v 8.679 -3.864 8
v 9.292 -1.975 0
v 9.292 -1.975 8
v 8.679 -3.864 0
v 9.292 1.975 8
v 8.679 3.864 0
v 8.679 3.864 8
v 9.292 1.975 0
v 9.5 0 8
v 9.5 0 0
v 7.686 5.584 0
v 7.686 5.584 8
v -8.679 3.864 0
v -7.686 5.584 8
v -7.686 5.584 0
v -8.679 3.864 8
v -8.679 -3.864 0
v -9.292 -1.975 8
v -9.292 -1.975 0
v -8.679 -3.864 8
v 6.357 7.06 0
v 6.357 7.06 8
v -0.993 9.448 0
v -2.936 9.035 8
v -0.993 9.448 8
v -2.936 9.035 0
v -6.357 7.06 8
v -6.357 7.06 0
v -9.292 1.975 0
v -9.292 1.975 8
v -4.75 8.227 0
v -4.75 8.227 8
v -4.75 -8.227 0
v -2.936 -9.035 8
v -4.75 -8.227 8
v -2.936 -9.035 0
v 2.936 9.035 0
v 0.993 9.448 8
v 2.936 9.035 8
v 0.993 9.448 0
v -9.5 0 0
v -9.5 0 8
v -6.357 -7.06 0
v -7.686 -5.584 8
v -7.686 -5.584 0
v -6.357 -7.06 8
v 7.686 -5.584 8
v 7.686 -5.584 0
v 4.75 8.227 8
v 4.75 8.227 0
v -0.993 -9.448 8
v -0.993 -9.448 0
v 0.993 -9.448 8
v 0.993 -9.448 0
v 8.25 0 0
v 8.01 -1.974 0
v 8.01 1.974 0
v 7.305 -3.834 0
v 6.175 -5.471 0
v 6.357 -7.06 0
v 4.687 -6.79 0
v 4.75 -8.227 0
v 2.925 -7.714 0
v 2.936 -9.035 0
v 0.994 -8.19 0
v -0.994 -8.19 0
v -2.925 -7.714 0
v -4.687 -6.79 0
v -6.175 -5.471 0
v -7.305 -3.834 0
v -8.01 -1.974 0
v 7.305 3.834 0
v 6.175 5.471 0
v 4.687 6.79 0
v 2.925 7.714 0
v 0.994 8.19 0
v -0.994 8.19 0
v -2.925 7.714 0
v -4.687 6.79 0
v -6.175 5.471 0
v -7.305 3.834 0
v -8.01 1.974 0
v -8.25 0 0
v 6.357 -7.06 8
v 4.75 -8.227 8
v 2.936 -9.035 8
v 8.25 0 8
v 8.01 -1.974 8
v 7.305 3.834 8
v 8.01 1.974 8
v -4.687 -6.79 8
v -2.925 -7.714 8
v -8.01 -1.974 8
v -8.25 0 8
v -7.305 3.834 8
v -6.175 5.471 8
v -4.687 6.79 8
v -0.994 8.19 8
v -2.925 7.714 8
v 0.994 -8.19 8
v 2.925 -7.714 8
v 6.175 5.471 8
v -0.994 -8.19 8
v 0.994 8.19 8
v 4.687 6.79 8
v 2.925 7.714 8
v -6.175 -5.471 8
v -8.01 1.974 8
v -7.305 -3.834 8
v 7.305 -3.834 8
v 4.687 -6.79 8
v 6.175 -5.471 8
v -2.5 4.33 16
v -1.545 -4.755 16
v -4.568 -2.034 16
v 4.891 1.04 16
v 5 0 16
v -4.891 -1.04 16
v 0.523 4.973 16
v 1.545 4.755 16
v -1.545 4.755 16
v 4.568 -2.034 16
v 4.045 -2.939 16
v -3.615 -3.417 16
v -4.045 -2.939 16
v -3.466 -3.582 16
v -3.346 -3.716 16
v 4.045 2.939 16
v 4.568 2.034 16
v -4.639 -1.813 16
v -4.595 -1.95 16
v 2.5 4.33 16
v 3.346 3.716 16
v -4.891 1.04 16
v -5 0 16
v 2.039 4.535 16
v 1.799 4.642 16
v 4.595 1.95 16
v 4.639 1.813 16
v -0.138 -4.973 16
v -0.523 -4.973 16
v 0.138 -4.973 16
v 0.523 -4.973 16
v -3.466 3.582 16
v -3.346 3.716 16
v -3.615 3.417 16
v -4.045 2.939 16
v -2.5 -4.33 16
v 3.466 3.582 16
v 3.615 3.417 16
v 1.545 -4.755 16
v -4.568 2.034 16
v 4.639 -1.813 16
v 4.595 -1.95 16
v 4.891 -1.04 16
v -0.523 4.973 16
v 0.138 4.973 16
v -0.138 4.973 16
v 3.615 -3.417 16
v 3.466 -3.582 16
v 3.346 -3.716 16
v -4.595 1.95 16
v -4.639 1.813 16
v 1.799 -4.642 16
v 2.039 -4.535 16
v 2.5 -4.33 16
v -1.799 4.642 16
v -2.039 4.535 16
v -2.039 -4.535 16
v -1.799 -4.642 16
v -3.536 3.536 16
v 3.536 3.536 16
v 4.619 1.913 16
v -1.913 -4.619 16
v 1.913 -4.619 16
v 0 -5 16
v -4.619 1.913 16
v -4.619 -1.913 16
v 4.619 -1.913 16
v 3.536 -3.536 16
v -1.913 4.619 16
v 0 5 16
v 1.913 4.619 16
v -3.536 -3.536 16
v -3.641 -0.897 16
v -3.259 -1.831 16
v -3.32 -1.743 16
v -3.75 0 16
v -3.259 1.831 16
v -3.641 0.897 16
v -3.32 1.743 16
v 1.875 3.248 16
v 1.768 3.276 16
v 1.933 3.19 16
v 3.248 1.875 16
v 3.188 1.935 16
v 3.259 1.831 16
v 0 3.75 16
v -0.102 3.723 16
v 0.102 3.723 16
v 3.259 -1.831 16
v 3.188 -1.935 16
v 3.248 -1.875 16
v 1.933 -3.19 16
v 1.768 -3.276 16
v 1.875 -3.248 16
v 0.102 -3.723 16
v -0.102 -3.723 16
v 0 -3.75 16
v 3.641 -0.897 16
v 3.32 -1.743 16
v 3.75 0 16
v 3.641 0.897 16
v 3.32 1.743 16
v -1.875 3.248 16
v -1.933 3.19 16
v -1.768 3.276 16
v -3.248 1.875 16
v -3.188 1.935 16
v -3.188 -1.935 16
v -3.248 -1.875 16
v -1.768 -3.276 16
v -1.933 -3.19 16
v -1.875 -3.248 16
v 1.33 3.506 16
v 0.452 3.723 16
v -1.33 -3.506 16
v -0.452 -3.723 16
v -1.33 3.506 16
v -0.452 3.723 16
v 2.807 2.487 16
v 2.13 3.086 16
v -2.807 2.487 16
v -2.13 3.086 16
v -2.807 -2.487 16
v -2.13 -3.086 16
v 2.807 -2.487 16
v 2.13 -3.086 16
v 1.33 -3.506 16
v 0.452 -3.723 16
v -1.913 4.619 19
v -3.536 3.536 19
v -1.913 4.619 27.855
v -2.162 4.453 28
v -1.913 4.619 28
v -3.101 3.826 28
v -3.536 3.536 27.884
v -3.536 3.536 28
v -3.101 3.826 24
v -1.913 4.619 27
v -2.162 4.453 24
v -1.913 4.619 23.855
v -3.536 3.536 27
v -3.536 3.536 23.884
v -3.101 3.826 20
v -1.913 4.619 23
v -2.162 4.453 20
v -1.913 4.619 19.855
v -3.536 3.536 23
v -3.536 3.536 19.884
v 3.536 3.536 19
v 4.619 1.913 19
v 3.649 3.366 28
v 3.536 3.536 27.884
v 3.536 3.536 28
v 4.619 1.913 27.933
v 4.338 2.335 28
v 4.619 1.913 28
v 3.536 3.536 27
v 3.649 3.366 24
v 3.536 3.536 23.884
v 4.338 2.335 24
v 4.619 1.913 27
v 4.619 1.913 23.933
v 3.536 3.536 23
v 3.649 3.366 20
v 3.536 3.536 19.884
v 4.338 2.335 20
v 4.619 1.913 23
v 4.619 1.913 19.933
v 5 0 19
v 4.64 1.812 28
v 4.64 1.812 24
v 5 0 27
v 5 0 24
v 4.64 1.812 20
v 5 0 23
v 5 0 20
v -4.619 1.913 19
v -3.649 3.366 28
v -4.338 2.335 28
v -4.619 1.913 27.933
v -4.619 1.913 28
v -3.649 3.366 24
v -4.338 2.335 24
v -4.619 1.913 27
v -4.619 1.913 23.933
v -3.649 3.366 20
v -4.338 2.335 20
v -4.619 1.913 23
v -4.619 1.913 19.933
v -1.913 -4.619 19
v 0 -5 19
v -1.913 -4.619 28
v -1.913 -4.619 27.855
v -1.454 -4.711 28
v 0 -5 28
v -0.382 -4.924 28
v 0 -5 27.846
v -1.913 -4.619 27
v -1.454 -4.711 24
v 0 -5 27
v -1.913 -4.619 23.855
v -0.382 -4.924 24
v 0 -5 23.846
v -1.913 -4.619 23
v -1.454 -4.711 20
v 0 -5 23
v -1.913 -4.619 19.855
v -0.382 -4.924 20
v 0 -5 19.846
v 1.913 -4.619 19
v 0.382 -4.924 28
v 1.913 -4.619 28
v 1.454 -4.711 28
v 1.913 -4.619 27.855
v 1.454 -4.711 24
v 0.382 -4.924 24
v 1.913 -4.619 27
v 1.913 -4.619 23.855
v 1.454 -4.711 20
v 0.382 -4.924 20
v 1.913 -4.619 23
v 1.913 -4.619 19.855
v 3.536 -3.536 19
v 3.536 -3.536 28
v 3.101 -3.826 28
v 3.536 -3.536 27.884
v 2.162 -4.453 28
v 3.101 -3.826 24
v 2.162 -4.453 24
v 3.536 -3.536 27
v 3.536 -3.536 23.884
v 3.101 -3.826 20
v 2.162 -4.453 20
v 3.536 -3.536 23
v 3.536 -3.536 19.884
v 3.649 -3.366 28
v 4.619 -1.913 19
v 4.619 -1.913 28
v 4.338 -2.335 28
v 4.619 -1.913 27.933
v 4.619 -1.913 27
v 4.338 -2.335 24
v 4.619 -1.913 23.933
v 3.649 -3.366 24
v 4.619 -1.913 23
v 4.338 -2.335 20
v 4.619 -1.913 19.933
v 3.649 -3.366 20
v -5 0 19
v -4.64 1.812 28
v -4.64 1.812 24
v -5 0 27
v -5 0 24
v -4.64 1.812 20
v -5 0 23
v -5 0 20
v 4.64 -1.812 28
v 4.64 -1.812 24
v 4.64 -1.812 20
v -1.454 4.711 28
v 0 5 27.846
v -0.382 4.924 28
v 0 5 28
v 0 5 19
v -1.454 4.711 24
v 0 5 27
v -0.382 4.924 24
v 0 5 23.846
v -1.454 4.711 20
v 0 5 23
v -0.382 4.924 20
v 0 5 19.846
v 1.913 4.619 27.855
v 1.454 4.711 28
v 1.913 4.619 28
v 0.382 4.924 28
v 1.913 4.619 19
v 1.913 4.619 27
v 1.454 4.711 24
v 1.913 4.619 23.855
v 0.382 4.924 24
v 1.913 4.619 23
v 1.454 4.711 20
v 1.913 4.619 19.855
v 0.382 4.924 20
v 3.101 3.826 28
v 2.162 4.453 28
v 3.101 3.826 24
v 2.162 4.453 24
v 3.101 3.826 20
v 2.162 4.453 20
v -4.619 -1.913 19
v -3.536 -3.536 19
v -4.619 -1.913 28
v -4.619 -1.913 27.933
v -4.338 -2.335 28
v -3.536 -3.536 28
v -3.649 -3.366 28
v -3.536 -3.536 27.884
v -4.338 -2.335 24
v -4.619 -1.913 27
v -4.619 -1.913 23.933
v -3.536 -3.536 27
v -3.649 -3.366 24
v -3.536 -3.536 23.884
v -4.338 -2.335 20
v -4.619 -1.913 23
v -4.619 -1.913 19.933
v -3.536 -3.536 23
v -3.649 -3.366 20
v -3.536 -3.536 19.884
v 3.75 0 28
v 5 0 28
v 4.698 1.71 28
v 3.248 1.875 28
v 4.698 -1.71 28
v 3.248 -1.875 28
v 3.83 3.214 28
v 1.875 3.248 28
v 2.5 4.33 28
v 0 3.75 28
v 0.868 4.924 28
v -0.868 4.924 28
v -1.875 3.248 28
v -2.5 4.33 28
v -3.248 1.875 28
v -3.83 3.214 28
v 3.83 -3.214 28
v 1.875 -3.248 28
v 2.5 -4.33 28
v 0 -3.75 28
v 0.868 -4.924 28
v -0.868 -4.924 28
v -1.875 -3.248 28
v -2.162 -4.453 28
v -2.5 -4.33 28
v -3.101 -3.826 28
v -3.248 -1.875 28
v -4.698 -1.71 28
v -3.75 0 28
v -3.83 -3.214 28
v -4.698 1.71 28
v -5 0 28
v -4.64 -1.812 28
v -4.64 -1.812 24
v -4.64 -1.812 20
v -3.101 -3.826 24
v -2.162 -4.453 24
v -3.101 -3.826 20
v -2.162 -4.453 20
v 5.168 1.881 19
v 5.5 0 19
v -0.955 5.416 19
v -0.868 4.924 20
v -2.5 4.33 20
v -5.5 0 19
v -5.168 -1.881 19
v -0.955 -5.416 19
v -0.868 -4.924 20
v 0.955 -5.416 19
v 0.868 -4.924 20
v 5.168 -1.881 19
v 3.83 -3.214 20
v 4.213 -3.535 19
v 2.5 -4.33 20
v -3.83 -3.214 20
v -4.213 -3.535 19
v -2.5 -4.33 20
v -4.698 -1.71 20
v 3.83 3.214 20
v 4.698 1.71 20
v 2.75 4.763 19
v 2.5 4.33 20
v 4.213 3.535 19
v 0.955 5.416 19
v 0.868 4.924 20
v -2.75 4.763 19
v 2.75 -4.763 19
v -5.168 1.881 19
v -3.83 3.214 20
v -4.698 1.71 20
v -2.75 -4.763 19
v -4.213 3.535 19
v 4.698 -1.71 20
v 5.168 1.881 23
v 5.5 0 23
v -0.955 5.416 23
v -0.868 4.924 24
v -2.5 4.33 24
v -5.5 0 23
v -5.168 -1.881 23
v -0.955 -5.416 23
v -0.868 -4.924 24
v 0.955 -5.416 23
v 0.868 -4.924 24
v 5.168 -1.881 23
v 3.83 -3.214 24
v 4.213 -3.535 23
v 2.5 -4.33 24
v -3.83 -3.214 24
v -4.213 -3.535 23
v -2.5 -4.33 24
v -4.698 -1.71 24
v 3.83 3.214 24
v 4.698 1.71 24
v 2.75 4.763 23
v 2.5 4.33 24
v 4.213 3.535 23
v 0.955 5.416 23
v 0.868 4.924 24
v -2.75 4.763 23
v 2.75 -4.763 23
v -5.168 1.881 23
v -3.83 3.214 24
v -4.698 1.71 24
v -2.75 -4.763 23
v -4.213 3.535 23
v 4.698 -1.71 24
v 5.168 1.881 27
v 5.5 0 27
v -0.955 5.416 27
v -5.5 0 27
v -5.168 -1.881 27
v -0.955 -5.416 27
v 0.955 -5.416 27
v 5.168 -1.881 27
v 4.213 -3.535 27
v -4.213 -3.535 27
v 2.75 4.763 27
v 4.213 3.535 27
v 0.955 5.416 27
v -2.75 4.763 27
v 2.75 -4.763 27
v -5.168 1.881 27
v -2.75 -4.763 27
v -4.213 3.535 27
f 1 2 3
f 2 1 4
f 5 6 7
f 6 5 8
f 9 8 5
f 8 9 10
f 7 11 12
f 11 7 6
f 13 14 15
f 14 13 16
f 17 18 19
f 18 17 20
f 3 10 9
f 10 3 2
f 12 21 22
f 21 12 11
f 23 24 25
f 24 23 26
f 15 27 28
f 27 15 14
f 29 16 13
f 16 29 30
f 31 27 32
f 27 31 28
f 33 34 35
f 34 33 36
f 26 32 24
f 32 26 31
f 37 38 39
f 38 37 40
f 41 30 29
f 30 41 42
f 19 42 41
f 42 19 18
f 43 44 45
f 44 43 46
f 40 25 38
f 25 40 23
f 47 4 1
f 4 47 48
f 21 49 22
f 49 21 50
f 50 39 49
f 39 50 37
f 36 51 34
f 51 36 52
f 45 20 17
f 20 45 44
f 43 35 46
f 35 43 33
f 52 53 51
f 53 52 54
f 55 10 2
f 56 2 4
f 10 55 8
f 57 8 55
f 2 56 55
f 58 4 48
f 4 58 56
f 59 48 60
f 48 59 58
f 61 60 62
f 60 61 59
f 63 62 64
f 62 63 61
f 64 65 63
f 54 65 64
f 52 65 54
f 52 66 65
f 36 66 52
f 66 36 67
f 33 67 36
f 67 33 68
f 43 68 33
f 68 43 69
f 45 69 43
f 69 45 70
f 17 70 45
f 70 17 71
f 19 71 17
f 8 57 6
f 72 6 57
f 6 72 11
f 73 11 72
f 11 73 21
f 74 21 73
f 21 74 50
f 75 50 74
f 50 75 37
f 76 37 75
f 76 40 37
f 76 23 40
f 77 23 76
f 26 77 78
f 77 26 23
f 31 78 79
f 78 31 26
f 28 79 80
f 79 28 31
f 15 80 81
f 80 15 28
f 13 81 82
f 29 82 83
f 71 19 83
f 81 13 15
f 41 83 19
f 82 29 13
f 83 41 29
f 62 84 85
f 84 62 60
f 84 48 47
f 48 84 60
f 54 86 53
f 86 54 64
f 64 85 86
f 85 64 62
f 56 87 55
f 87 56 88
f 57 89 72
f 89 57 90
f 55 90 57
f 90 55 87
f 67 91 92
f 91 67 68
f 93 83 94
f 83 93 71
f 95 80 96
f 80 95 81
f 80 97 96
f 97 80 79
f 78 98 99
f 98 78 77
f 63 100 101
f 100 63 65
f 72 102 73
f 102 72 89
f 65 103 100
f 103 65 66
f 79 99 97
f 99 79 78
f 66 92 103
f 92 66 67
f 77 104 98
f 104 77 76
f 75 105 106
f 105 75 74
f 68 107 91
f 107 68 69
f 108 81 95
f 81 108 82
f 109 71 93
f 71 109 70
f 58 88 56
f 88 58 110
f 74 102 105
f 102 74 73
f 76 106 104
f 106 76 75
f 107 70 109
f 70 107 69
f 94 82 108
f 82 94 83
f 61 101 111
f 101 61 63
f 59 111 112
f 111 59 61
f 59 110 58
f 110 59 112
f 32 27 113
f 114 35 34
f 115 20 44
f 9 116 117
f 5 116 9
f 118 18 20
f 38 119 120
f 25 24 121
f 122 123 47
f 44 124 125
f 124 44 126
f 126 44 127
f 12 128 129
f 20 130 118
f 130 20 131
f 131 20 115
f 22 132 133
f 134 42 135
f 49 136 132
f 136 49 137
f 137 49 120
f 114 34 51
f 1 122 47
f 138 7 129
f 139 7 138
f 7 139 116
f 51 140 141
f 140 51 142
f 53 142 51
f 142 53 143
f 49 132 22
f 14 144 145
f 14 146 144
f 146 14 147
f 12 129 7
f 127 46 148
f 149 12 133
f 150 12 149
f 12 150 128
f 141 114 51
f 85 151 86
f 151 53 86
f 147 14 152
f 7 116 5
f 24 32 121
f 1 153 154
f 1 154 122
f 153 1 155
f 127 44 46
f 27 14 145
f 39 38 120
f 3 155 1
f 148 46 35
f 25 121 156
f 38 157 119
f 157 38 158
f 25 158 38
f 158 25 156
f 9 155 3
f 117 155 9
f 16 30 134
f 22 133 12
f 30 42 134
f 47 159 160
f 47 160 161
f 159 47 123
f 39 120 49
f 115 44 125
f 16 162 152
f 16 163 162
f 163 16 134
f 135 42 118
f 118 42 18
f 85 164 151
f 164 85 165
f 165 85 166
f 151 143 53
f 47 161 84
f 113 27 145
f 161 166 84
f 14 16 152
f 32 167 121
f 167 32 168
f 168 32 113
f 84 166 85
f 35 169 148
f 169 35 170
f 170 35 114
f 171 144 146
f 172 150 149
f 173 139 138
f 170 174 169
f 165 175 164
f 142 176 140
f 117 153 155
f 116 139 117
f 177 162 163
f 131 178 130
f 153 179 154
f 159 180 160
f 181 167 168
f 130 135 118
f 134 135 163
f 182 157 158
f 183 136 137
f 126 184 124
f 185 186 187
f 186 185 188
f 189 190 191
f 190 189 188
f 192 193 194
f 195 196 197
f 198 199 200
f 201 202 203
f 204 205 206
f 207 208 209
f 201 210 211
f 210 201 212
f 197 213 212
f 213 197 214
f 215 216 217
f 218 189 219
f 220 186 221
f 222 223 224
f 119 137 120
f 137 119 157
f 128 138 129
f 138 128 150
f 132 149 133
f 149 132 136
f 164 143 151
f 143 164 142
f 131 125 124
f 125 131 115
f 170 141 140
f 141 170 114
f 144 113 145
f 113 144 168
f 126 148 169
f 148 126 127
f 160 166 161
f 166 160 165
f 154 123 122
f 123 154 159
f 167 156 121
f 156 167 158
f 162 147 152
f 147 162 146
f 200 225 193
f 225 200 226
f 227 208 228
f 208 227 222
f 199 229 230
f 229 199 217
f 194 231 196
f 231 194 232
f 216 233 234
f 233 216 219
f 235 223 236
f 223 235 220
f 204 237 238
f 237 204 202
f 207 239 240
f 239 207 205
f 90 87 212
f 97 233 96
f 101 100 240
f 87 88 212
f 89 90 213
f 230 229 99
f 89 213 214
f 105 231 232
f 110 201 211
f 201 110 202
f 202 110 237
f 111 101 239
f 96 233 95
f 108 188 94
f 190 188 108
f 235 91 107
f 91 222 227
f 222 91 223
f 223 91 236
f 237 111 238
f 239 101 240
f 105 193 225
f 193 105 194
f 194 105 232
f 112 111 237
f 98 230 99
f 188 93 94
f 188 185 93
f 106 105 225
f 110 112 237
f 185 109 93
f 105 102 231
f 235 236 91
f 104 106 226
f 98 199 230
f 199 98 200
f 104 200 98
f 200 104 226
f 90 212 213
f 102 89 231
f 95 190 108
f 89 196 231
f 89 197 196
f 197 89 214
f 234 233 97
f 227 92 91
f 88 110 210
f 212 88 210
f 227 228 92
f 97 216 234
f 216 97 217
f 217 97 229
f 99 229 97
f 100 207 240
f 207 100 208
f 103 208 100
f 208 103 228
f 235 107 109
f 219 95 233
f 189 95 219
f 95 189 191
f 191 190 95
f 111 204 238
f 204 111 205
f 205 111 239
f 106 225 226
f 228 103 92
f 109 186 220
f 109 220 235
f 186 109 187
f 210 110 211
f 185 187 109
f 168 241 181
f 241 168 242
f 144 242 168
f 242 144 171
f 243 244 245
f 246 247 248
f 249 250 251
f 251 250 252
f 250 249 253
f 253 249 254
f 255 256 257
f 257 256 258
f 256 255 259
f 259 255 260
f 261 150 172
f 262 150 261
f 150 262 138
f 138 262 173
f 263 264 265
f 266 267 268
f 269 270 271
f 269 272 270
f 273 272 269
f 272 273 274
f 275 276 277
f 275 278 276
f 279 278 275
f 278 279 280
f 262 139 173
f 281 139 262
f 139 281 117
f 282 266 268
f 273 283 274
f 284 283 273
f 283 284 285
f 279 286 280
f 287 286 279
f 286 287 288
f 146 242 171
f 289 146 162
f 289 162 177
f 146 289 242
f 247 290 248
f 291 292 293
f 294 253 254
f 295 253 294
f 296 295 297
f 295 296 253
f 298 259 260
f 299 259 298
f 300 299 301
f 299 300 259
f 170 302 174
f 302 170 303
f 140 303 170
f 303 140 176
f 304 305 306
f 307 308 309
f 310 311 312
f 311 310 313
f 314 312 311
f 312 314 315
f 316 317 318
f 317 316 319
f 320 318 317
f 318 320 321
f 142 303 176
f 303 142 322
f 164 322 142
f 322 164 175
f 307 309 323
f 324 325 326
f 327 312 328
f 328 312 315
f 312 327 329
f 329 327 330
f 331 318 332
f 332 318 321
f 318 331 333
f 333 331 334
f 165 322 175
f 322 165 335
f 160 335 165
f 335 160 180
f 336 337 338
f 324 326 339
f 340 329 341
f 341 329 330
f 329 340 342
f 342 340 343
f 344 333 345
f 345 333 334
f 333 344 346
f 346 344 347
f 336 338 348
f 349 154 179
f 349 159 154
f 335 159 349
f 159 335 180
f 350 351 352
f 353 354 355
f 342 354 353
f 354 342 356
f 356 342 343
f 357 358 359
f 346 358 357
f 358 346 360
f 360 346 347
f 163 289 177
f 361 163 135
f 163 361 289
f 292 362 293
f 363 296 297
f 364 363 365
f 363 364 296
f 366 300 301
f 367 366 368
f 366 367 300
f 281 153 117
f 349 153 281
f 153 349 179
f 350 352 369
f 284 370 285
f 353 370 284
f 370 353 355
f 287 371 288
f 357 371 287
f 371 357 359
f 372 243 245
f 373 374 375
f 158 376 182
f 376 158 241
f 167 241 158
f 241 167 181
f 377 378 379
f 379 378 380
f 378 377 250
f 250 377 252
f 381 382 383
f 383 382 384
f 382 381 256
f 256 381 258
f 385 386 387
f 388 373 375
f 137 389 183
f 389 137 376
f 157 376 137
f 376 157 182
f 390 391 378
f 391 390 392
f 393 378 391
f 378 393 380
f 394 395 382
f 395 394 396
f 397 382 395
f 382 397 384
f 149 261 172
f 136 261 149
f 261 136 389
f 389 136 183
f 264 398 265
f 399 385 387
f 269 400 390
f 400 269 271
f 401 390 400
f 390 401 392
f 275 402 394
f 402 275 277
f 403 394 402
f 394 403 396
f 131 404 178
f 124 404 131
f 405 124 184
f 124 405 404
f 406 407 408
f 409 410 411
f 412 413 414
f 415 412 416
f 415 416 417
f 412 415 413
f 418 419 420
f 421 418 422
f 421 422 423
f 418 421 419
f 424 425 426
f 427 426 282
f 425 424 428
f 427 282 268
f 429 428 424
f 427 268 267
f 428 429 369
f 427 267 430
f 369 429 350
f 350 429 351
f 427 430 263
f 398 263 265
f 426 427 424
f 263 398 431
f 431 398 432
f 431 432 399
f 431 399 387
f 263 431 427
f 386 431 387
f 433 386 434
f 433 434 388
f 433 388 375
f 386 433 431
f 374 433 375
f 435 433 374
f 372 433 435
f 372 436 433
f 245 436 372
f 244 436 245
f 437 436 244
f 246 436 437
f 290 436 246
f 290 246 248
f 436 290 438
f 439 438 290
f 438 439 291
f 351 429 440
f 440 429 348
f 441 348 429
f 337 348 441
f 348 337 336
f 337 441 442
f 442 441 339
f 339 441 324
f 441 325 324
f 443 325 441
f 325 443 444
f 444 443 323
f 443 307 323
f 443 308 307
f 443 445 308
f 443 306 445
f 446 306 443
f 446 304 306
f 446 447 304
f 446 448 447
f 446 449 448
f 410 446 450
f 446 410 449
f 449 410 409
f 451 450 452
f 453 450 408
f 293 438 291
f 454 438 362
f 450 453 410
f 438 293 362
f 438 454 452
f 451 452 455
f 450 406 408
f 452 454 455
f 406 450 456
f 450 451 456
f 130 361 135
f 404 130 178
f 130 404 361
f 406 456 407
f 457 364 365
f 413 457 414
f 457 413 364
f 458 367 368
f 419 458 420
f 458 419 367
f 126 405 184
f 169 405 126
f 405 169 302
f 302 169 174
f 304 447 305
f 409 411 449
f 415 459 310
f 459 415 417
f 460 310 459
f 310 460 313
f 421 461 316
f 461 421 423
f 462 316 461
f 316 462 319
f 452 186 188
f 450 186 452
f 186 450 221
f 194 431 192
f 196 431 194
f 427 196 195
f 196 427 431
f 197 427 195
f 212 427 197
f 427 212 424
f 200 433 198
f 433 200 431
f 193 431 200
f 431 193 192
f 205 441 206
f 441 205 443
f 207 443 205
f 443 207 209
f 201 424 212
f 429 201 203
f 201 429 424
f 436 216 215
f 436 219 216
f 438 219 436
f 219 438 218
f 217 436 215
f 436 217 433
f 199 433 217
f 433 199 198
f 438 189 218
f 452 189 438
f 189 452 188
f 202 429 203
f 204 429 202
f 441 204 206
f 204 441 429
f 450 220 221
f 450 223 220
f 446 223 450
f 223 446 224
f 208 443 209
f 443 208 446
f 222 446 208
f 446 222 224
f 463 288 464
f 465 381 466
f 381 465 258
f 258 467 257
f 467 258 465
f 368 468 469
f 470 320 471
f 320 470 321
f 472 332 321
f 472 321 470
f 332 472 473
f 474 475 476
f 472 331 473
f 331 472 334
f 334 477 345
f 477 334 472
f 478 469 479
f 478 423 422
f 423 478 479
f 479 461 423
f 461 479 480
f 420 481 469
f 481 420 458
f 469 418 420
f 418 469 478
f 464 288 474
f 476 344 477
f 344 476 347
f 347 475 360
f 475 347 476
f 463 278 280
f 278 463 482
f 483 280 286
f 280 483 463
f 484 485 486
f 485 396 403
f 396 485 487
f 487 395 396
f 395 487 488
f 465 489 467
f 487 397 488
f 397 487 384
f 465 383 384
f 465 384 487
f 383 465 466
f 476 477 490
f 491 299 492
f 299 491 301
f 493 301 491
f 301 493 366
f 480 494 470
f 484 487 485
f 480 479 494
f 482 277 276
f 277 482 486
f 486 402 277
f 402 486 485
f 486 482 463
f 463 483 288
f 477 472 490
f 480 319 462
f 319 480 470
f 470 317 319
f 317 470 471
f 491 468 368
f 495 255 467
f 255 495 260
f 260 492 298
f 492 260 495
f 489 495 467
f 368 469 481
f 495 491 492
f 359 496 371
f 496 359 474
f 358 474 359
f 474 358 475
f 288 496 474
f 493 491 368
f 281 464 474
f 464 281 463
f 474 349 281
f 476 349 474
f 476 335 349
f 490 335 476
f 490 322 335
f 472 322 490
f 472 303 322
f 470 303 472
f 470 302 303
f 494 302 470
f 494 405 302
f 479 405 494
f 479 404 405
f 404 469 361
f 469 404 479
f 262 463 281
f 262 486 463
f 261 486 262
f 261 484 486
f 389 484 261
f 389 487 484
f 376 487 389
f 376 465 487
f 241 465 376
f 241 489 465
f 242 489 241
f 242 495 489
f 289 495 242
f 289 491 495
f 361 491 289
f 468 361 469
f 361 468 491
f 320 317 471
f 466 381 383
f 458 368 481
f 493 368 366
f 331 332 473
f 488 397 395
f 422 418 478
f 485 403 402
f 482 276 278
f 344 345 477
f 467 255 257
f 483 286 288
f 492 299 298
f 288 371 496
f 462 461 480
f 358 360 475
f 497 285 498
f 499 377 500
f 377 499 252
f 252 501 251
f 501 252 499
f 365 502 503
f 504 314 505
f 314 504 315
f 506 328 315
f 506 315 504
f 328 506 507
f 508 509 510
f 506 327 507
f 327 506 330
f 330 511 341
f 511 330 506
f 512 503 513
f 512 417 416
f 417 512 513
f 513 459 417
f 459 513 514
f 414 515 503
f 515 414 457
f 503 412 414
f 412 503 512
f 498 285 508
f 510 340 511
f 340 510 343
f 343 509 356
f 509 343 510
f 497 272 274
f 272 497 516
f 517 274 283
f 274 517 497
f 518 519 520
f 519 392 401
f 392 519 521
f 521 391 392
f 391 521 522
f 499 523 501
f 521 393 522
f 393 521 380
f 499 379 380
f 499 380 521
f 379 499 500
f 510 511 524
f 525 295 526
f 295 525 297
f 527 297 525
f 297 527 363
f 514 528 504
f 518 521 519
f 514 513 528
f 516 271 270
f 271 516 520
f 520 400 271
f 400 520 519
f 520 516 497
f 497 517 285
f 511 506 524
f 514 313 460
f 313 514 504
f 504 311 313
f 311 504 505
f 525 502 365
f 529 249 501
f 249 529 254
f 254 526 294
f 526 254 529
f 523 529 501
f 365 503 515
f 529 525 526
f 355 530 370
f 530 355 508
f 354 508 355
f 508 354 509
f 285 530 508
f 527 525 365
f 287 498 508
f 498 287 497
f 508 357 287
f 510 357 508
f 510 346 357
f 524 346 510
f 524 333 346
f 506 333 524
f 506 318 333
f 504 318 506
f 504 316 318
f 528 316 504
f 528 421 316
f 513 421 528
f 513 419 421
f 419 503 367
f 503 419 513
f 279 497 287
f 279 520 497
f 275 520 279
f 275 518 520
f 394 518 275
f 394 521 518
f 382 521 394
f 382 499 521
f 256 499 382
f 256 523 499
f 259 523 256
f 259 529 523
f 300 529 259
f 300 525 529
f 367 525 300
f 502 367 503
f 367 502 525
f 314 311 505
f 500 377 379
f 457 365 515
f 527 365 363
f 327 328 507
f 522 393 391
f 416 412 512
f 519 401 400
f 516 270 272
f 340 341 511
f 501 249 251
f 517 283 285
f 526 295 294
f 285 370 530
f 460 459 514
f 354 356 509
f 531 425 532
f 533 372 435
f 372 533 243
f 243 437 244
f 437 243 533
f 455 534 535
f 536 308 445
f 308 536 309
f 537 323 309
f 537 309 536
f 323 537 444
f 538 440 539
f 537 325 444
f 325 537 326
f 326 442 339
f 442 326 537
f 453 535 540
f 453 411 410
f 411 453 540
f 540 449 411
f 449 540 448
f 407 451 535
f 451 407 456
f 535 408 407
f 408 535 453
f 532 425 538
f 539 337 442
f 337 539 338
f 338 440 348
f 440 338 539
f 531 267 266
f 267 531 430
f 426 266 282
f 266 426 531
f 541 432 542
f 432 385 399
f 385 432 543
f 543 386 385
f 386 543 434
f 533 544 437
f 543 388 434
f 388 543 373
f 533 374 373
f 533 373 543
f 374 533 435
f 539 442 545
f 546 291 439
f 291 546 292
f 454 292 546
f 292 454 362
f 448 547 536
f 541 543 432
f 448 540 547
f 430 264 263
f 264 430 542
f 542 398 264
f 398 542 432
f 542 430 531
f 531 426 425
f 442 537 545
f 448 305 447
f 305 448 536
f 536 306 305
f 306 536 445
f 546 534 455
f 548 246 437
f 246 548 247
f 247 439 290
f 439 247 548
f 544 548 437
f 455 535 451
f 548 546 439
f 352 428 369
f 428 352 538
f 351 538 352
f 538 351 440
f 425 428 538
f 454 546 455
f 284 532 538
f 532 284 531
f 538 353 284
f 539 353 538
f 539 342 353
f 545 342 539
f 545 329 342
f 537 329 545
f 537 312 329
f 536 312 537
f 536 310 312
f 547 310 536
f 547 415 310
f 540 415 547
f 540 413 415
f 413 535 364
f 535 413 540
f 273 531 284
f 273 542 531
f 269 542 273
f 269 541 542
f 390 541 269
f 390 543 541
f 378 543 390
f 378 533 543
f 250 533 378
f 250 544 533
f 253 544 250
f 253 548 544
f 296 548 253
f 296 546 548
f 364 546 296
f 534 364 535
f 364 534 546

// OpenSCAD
difference(){
cylinder(h = 8, r1 = 9.5, r2 = 9.5);
    cylinder(h=8,r1 =8.25,r2=8.25);
}
translate([0, 0, 8])
difference(){
cylinder(h = 8, r1 = 9.5, r2 = 5);
    cylinder(h=8,r1 =8.25,r2=3.75);
}
translate([0, 0, 16])
difference(){
cylinder(h = 12, r1 = 5, r2 = 5);
    cylinder(h=12,r1 =3.75,r2=3.75);
}
translate([0, 0, 19])
difference(){
cylinder(h = 1, r1 = 5.5, r2 = 5);
    cylinder(h=1,r1 =3.75,r2=3.75);
}
translate([0, 0, 23])
difference(){
cylinder(h = 1, r1 = 5.5, r2 = 5);
    cylinder(h=1,r1 =3.75,r2=3.75);
}
translate([0, 0, 27])
difference(){
cylinder(h = 1, r1 = 5.5, r2 = 5);
    cylinder(h=1,r1 =3.75,r2=3.75);
}
